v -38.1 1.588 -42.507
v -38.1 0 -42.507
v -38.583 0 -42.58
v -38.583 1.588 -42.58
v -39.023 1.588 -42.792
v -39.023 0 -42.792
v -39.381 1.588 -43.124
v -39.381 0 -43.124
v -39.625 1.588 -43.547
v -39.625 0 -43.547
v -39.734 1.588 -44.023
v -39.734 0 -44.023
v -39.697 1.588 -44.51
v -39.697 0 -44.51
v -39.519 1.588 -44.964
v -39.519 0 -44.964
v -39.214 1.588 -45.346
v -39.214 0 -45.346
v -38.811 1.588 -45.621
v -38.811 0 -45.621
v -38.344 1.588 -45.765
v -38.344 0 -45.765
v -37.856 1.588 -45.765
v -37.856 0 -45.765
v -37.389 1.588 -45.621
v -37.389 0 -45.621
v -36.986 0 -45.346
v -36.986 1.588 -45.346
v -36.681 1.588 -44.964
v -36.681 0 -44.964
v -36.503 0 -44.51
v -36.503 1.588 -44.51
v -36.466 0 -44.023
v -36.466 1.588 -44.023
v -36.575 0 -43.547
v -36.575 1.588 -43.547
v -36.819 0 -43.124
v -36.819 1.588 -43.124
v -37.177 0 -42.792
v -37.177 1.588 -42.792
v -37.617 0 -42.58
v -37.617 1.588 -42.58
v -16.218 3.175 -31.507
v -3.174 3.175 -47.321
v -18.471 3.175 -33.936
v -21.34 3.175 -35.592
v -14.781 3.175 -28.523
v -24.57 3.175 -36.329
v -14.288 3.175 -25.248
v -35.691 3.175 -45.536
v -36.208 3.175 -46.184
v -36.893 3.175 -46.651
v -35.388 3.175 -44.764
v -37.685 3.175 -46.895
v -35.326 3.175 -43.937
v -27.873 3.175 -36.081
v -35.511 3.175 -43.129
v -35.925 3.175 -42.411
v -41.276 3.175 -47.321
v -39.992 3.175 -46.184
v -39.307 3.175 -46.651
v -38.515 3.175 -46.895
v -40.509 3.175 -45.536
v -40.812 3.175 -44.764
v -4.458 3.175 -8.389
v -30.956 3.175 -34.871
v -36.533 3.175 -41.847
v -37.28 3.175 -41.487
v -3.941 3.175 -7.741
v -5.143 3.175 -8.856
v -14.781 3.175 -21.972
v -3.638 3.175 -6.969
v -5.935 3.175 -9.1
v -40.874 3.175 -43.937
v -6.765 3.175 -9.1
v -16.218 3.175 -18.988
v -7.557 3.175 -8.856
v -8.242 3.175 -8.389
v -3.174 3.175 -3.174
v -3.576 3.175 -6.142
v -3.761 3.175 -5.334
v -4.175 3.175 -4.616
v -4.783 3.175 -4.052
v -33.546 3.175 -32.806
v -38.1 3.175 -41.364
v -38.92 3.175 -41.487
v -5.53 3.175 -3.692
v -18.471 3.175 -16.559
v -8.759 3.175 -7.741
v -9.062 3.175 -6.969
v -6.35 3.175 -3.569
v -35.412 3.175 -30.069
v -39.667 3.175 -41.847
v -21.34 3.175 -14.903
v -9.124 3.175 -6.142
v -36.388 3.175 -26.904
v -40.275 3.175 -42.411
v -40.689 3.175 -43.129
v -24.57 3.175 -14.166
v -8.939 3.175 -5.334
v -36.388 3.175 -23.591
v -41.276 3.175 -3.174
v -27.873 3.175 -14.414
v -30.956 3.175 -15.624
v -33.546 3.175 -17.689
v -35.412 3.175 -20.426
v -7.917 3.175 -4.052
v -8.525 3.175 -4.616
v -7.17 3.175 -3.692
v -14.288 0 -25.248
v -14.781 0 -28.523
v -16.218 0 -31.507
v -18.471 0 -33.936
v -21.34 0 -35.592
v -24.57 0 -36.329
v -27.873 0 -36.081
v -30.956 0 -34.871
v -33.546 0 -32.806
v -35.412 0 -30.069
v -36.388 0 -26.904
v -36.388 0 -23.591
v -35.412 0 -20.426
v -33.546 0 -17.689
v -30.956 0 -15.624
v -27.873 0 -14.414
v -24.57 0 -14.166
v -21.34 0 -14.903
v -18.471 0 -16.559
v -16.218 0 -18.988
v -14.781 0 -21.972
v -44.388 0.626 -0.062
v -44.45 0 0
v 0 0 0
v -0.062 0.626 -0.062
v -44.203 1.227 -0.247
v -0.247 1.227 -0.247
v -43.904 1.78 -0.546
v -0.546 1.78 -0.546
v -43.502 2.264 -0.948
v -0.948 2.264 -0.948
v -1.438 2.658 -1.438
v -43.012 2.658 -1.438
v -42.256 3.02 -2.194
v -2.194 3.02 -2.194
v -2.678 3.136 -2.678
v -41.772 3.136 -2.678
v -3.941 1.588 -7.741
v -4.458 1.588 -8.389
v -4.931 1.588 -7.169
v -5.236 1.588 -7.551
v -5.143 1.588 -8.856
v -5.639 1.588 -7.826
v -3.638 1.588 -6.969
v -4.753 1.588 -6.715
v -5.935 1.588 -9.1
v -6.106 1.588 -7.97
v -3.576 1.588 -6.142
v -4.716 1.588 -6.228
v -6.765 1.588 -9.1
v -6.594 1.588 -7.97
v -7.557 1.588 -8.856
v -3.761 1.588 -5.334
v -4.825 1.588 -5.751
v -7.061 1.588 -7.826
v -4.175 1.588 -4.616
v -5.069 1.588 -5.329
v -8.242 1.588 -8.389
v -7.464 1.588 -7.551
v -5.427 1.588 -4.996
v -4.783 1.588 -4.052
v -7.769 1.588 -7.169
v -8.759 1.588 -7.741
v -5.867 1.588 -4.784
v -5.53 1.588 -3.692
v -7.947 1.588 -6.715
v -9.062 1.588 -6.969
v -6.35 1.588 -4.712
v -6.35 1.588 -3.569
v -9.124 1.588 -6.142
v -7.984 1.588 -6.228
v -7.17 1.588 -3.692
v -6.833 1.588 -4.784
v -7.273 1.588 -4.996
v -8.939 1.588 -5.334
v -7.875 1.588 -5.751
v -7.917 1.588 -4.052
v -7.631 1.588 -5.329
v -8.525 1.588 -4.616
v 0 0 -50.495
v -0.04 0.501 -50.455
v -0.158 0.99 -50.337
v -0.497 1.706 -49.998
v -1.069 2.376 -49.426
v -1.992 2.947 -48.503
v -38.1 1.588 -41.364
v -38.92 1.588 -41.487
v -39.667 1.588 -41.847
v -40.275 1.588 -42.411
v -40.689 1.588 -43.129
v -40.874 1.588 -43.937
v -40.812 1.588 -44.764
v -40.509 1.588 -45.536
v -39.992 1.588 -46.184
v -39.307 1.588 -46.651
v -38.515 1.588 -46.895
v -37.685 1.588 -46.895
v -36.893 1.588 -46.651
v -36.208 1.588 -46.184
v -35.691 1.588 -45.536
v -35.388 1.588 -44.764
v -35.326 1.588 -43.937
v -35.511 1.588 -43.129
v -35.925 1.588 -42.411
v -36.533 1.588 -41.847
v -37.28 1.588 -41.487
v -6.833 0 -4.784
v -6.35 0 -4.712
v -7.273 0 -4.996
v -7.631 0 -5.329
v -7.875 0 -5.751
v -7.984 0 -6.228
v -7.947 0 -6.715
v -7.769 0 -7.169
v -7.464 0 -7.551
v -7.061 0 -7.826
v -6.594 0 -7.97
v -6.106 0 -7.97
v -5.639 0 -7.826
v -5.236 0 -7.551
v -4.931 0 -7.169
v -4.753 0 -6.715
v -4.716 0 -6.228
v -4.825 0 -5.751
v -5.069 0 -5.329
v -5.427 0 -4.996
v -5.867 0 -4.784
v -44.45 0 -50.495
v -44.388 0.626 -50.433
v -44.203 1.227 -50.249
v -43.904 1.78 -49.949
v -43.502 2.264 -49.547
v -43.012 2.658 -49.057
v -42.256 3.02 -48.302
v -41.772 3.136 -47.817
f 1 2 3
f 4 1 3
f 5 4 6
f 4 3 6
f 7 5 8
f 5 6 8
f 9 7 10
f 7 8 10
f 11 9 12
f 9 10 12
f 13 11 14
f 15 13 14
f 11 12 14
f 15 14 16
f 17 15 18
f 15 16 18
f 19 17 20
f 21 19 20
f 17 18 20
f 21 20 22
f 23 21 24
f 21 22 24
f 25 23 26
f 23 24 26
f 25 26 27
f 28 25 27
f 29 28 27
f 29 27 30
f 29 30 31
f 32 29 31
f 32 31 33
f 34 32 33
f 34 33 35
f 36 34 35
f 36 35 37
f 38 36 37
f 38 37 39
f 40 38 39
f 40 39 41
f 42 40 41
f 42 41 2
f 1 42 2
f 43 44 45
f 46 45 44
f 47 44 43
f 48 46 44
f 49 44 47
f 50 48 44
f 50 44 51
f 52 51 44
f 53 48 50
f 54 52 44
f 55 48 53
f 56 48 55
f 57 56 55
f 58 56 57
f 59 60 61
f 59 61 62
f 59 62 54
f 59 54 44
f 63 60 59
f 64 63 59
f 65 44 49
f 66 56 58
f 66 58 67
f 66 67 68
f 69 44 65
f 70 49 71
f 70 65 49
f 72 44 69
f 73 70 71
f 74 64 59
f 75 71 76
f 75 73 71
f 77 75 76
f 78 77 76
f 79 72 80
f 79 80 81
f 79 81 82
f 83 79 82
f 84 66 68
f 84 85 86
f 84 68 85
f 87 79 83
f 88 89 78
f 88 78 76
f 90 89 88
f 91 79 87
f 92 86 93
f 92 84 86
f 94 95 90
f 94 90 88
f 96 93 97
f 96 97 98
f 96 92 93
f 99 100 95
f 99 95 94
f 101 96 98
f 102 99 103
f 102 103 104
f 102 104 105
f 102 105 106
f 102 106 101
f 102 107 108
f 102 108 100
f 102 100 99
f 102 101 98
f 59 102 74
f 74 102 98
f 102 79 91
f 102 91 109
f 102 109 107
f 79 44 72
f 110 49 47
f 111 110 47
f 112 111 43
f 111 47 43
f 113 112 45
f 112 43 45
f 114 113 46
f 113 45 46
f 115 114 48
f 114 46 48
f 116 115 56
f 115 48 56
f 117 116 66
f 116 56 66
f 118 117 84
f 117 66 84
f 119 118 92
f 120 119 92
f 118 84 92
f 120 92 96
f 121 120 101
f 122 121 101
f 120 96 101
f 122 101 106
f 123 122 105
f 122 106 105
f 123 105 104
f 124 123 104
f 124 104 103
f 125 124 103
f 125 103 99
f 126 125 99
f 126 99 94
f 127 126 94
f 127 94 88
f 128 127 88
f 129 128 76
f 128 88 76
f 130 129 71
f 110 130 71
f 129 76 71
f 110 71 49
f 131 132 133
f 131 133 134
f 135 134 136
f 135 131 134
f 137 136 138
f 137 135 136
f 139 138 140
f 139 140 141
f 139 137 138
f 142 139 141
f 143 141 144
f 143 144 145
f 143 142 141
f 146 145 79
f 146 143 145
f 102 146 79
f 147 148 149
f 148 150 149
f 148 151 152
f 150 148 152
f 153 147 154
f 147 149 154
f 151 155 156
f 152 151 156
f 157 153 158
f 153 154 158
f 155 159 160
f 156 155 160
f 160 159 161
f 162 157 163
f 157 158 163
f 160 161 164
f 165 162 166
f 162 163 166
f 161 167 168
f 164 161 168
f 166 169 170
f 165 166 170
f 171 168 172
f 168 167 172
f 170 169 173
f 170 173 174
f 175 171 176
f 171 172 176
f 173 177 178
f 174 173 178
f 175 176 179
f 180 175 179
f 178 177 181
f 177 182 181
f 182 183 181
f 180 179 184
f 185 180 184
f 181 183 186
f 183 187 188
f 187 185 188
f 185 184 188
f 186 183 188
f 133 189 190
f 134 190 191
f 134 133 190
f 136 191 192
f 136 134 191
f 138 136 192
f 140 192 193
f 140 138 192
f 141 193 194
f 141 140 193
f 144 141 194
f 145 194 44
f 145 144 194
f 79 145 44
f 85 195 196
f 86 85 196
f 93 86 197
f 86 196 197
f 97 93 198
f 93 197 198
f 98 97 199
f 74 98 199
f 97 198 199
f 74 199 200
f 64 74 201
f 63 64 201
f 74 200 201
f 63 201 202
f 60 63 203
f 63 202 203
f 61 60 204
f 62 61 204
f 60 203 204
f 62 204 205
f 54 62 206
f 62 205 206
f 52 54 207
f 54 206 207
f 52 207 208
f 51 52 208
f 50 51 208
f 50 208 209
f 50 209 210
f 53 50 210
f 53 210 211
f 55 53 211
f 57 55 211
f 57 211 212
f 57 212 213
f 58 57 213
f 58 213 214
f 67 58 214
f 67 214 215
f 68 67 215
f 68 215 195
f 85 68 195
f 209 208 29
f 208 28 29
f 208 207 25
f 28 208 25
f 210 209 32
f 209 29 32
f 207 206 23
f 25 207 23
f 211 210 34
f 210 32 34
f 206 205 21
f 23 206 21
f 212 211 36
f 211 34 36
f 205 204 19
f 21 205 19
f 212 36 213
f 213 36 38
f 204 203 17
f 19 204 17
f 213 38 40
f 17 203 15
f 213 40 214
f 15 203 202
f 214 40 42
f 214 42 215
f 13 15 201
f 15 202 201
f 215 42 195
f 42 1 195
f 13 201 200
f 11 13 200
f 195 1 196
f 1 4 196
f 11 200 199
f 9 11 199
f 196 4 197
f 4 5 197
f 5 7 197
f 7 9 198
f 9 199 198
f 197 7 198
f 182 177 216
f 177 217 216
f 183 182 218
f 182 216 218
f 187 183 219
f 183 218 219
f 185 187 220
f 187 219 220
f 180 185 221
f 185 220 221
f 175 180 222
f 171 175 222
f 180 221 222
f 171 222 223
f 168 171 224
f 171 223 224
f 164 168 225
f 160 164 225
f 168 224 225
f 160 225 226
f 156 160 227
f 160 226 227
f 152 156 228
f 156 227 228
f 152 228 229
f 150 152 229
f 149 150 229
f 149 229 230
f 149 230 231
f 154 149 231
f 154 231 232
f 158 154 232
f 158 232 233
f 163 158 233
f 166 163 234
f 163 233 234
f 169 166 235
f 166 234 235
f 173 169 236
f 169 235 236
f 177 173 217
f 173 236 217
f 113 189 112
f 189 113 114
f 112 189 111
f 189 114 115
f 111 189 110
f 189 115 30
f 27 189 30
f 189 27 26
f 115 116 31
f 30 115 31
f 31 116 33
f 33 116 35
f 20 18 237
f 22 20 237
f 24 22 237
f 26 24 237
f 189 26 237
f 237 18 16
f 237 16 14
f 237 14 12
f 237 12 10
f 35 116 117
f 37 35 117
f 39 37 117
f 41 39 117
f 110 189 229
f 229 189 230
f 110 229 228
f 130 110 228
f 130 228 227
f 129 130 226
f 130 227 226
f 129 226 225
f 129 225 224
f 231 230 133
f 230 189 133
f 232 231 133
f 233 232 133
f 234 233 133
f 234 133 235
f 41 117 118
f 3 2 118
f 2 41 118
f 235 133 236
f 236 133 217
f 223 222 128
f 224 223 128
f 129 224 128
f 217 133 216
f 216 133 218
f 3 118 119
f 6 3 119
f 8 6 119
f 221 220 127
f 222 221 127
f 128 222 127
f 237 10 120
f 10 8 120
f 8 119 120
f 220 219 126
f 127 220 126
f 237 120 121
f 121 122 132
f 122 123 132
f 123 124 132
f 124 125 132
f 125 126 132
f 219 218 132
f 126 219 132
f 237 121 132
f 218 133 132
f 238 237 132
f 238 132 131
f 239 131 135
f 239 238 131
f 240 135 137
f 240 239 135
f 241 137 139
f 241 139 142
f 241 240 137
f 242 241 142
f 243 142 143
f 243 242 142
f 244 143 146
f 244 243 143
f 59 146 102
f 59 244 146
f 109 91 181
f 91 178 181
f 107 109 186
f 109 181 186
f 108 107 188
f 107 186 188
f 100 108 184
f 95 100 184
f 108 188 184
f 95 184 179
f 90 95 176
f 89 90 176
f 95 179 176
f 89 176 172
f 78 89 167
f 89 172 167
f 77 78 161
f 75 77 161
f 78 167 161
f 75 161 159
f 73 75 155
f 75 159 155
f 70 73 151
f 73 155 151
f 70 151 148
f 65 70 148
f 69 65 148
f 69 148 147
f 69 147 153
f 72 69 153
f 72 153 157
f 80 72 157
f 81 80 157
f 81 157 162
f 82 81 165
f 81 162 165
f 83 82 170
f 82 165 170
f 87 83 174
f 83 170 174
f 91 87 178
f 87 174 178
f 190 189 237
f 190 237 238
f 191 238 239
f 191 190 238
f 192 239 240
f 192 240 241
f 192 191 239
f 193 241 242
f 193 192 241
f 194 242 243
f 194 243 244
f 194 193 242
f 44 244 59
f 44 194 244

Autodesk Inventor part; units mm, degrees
ref_plane "YZ Plane" through (0, 0, 0) normal (1, 0, 0) x (0, 1, 0)
ref_plane "XZ Plane" through (0, 0, 0) normal (0, 1, 0) x (-1, 0, 0)
ref_plane "XY Plane" through (0, 0, 0) normal (0, 0, 1) x (1, 0, 0)
sketch "Sketch1" plane through (0, 0, 0) normal (0, 1, 0) x (-1, 0, 0)
  line L0 (0, 0) -> (44.45, 0)
  line L1 (44.45, 0) -> (44.45, -50.4952)
  line L2 (44.45, -50.4952) -> (0, -50.4952)
  line L3 (0, -50.4952) -> (0, 0)
  dimension "d0" = 44.45
  dimension "d1" = 50.4952
extrude "Extrusion1" add sketch "Sketch1" along normal blind 3.175
sketch "Sketch2" plane through (0, 3.175, 0) normal (0, 1, 0) x (1, 0, 0)
  line L0 (-44.45, 50.4952) -> (-44.45, 0) projected
  line L1 (-44.45, 50.4952) -> (-38.1, 50.4952)
  line L2 (0, 50.4952) -> (-44.45, 50.4952) projected
  line L3 (-38.1, 50.4952) -> (-38.1, 44.1452)
  line L4 (-44.45, 0) -> (0, 0) projected
  line L5 (0, 0) -> (-6.35, 0)
  line L6 (-6.35, 0) -> (-6.35, 6.35)
  line L7 (-44.45, 50.4952) -> (-44.45, 25.2476)
  line L8 (-44.45, 25.2476) -> (-25.4, 25.2476)
  circle A0 centre (-25.4, 25.2476) radius 11.1125
  dimension "d4" = 6.35
  dimension "d5" = 6.35
  dimension "d6" = 6.35
  dimension "d7" = 6.35
  dimension "d15" = 25.2476
  dimension "d16" = 19.05
  dimension "d17" = 22.225
hole "Hole1" at (-6.35, 3.175, -6.35) at (-38.1, 3.175, -44.1452) direction (0, -1, 0) diameter 3.2766 depth 12.7 tip angle 118 counterbore diameter 5.5626 counterbore depth 1.5875 clearance for "Socket Head Cap Screw" size "#4" standard "Ansi Unified Screw Threads"
extrude "Extrusion2" cut sketch "Sketch2" against normal blind 3.175
fillet "Fillet1" radius 3.175 4 edges at (-44.45, 3.175, -25.2476) (-22.225, 3.175, -50.4952) (0, 3.175, -25.2476) (-22.225, 3.175, 0)
properties part number "sample holder lid for neutron r1"
